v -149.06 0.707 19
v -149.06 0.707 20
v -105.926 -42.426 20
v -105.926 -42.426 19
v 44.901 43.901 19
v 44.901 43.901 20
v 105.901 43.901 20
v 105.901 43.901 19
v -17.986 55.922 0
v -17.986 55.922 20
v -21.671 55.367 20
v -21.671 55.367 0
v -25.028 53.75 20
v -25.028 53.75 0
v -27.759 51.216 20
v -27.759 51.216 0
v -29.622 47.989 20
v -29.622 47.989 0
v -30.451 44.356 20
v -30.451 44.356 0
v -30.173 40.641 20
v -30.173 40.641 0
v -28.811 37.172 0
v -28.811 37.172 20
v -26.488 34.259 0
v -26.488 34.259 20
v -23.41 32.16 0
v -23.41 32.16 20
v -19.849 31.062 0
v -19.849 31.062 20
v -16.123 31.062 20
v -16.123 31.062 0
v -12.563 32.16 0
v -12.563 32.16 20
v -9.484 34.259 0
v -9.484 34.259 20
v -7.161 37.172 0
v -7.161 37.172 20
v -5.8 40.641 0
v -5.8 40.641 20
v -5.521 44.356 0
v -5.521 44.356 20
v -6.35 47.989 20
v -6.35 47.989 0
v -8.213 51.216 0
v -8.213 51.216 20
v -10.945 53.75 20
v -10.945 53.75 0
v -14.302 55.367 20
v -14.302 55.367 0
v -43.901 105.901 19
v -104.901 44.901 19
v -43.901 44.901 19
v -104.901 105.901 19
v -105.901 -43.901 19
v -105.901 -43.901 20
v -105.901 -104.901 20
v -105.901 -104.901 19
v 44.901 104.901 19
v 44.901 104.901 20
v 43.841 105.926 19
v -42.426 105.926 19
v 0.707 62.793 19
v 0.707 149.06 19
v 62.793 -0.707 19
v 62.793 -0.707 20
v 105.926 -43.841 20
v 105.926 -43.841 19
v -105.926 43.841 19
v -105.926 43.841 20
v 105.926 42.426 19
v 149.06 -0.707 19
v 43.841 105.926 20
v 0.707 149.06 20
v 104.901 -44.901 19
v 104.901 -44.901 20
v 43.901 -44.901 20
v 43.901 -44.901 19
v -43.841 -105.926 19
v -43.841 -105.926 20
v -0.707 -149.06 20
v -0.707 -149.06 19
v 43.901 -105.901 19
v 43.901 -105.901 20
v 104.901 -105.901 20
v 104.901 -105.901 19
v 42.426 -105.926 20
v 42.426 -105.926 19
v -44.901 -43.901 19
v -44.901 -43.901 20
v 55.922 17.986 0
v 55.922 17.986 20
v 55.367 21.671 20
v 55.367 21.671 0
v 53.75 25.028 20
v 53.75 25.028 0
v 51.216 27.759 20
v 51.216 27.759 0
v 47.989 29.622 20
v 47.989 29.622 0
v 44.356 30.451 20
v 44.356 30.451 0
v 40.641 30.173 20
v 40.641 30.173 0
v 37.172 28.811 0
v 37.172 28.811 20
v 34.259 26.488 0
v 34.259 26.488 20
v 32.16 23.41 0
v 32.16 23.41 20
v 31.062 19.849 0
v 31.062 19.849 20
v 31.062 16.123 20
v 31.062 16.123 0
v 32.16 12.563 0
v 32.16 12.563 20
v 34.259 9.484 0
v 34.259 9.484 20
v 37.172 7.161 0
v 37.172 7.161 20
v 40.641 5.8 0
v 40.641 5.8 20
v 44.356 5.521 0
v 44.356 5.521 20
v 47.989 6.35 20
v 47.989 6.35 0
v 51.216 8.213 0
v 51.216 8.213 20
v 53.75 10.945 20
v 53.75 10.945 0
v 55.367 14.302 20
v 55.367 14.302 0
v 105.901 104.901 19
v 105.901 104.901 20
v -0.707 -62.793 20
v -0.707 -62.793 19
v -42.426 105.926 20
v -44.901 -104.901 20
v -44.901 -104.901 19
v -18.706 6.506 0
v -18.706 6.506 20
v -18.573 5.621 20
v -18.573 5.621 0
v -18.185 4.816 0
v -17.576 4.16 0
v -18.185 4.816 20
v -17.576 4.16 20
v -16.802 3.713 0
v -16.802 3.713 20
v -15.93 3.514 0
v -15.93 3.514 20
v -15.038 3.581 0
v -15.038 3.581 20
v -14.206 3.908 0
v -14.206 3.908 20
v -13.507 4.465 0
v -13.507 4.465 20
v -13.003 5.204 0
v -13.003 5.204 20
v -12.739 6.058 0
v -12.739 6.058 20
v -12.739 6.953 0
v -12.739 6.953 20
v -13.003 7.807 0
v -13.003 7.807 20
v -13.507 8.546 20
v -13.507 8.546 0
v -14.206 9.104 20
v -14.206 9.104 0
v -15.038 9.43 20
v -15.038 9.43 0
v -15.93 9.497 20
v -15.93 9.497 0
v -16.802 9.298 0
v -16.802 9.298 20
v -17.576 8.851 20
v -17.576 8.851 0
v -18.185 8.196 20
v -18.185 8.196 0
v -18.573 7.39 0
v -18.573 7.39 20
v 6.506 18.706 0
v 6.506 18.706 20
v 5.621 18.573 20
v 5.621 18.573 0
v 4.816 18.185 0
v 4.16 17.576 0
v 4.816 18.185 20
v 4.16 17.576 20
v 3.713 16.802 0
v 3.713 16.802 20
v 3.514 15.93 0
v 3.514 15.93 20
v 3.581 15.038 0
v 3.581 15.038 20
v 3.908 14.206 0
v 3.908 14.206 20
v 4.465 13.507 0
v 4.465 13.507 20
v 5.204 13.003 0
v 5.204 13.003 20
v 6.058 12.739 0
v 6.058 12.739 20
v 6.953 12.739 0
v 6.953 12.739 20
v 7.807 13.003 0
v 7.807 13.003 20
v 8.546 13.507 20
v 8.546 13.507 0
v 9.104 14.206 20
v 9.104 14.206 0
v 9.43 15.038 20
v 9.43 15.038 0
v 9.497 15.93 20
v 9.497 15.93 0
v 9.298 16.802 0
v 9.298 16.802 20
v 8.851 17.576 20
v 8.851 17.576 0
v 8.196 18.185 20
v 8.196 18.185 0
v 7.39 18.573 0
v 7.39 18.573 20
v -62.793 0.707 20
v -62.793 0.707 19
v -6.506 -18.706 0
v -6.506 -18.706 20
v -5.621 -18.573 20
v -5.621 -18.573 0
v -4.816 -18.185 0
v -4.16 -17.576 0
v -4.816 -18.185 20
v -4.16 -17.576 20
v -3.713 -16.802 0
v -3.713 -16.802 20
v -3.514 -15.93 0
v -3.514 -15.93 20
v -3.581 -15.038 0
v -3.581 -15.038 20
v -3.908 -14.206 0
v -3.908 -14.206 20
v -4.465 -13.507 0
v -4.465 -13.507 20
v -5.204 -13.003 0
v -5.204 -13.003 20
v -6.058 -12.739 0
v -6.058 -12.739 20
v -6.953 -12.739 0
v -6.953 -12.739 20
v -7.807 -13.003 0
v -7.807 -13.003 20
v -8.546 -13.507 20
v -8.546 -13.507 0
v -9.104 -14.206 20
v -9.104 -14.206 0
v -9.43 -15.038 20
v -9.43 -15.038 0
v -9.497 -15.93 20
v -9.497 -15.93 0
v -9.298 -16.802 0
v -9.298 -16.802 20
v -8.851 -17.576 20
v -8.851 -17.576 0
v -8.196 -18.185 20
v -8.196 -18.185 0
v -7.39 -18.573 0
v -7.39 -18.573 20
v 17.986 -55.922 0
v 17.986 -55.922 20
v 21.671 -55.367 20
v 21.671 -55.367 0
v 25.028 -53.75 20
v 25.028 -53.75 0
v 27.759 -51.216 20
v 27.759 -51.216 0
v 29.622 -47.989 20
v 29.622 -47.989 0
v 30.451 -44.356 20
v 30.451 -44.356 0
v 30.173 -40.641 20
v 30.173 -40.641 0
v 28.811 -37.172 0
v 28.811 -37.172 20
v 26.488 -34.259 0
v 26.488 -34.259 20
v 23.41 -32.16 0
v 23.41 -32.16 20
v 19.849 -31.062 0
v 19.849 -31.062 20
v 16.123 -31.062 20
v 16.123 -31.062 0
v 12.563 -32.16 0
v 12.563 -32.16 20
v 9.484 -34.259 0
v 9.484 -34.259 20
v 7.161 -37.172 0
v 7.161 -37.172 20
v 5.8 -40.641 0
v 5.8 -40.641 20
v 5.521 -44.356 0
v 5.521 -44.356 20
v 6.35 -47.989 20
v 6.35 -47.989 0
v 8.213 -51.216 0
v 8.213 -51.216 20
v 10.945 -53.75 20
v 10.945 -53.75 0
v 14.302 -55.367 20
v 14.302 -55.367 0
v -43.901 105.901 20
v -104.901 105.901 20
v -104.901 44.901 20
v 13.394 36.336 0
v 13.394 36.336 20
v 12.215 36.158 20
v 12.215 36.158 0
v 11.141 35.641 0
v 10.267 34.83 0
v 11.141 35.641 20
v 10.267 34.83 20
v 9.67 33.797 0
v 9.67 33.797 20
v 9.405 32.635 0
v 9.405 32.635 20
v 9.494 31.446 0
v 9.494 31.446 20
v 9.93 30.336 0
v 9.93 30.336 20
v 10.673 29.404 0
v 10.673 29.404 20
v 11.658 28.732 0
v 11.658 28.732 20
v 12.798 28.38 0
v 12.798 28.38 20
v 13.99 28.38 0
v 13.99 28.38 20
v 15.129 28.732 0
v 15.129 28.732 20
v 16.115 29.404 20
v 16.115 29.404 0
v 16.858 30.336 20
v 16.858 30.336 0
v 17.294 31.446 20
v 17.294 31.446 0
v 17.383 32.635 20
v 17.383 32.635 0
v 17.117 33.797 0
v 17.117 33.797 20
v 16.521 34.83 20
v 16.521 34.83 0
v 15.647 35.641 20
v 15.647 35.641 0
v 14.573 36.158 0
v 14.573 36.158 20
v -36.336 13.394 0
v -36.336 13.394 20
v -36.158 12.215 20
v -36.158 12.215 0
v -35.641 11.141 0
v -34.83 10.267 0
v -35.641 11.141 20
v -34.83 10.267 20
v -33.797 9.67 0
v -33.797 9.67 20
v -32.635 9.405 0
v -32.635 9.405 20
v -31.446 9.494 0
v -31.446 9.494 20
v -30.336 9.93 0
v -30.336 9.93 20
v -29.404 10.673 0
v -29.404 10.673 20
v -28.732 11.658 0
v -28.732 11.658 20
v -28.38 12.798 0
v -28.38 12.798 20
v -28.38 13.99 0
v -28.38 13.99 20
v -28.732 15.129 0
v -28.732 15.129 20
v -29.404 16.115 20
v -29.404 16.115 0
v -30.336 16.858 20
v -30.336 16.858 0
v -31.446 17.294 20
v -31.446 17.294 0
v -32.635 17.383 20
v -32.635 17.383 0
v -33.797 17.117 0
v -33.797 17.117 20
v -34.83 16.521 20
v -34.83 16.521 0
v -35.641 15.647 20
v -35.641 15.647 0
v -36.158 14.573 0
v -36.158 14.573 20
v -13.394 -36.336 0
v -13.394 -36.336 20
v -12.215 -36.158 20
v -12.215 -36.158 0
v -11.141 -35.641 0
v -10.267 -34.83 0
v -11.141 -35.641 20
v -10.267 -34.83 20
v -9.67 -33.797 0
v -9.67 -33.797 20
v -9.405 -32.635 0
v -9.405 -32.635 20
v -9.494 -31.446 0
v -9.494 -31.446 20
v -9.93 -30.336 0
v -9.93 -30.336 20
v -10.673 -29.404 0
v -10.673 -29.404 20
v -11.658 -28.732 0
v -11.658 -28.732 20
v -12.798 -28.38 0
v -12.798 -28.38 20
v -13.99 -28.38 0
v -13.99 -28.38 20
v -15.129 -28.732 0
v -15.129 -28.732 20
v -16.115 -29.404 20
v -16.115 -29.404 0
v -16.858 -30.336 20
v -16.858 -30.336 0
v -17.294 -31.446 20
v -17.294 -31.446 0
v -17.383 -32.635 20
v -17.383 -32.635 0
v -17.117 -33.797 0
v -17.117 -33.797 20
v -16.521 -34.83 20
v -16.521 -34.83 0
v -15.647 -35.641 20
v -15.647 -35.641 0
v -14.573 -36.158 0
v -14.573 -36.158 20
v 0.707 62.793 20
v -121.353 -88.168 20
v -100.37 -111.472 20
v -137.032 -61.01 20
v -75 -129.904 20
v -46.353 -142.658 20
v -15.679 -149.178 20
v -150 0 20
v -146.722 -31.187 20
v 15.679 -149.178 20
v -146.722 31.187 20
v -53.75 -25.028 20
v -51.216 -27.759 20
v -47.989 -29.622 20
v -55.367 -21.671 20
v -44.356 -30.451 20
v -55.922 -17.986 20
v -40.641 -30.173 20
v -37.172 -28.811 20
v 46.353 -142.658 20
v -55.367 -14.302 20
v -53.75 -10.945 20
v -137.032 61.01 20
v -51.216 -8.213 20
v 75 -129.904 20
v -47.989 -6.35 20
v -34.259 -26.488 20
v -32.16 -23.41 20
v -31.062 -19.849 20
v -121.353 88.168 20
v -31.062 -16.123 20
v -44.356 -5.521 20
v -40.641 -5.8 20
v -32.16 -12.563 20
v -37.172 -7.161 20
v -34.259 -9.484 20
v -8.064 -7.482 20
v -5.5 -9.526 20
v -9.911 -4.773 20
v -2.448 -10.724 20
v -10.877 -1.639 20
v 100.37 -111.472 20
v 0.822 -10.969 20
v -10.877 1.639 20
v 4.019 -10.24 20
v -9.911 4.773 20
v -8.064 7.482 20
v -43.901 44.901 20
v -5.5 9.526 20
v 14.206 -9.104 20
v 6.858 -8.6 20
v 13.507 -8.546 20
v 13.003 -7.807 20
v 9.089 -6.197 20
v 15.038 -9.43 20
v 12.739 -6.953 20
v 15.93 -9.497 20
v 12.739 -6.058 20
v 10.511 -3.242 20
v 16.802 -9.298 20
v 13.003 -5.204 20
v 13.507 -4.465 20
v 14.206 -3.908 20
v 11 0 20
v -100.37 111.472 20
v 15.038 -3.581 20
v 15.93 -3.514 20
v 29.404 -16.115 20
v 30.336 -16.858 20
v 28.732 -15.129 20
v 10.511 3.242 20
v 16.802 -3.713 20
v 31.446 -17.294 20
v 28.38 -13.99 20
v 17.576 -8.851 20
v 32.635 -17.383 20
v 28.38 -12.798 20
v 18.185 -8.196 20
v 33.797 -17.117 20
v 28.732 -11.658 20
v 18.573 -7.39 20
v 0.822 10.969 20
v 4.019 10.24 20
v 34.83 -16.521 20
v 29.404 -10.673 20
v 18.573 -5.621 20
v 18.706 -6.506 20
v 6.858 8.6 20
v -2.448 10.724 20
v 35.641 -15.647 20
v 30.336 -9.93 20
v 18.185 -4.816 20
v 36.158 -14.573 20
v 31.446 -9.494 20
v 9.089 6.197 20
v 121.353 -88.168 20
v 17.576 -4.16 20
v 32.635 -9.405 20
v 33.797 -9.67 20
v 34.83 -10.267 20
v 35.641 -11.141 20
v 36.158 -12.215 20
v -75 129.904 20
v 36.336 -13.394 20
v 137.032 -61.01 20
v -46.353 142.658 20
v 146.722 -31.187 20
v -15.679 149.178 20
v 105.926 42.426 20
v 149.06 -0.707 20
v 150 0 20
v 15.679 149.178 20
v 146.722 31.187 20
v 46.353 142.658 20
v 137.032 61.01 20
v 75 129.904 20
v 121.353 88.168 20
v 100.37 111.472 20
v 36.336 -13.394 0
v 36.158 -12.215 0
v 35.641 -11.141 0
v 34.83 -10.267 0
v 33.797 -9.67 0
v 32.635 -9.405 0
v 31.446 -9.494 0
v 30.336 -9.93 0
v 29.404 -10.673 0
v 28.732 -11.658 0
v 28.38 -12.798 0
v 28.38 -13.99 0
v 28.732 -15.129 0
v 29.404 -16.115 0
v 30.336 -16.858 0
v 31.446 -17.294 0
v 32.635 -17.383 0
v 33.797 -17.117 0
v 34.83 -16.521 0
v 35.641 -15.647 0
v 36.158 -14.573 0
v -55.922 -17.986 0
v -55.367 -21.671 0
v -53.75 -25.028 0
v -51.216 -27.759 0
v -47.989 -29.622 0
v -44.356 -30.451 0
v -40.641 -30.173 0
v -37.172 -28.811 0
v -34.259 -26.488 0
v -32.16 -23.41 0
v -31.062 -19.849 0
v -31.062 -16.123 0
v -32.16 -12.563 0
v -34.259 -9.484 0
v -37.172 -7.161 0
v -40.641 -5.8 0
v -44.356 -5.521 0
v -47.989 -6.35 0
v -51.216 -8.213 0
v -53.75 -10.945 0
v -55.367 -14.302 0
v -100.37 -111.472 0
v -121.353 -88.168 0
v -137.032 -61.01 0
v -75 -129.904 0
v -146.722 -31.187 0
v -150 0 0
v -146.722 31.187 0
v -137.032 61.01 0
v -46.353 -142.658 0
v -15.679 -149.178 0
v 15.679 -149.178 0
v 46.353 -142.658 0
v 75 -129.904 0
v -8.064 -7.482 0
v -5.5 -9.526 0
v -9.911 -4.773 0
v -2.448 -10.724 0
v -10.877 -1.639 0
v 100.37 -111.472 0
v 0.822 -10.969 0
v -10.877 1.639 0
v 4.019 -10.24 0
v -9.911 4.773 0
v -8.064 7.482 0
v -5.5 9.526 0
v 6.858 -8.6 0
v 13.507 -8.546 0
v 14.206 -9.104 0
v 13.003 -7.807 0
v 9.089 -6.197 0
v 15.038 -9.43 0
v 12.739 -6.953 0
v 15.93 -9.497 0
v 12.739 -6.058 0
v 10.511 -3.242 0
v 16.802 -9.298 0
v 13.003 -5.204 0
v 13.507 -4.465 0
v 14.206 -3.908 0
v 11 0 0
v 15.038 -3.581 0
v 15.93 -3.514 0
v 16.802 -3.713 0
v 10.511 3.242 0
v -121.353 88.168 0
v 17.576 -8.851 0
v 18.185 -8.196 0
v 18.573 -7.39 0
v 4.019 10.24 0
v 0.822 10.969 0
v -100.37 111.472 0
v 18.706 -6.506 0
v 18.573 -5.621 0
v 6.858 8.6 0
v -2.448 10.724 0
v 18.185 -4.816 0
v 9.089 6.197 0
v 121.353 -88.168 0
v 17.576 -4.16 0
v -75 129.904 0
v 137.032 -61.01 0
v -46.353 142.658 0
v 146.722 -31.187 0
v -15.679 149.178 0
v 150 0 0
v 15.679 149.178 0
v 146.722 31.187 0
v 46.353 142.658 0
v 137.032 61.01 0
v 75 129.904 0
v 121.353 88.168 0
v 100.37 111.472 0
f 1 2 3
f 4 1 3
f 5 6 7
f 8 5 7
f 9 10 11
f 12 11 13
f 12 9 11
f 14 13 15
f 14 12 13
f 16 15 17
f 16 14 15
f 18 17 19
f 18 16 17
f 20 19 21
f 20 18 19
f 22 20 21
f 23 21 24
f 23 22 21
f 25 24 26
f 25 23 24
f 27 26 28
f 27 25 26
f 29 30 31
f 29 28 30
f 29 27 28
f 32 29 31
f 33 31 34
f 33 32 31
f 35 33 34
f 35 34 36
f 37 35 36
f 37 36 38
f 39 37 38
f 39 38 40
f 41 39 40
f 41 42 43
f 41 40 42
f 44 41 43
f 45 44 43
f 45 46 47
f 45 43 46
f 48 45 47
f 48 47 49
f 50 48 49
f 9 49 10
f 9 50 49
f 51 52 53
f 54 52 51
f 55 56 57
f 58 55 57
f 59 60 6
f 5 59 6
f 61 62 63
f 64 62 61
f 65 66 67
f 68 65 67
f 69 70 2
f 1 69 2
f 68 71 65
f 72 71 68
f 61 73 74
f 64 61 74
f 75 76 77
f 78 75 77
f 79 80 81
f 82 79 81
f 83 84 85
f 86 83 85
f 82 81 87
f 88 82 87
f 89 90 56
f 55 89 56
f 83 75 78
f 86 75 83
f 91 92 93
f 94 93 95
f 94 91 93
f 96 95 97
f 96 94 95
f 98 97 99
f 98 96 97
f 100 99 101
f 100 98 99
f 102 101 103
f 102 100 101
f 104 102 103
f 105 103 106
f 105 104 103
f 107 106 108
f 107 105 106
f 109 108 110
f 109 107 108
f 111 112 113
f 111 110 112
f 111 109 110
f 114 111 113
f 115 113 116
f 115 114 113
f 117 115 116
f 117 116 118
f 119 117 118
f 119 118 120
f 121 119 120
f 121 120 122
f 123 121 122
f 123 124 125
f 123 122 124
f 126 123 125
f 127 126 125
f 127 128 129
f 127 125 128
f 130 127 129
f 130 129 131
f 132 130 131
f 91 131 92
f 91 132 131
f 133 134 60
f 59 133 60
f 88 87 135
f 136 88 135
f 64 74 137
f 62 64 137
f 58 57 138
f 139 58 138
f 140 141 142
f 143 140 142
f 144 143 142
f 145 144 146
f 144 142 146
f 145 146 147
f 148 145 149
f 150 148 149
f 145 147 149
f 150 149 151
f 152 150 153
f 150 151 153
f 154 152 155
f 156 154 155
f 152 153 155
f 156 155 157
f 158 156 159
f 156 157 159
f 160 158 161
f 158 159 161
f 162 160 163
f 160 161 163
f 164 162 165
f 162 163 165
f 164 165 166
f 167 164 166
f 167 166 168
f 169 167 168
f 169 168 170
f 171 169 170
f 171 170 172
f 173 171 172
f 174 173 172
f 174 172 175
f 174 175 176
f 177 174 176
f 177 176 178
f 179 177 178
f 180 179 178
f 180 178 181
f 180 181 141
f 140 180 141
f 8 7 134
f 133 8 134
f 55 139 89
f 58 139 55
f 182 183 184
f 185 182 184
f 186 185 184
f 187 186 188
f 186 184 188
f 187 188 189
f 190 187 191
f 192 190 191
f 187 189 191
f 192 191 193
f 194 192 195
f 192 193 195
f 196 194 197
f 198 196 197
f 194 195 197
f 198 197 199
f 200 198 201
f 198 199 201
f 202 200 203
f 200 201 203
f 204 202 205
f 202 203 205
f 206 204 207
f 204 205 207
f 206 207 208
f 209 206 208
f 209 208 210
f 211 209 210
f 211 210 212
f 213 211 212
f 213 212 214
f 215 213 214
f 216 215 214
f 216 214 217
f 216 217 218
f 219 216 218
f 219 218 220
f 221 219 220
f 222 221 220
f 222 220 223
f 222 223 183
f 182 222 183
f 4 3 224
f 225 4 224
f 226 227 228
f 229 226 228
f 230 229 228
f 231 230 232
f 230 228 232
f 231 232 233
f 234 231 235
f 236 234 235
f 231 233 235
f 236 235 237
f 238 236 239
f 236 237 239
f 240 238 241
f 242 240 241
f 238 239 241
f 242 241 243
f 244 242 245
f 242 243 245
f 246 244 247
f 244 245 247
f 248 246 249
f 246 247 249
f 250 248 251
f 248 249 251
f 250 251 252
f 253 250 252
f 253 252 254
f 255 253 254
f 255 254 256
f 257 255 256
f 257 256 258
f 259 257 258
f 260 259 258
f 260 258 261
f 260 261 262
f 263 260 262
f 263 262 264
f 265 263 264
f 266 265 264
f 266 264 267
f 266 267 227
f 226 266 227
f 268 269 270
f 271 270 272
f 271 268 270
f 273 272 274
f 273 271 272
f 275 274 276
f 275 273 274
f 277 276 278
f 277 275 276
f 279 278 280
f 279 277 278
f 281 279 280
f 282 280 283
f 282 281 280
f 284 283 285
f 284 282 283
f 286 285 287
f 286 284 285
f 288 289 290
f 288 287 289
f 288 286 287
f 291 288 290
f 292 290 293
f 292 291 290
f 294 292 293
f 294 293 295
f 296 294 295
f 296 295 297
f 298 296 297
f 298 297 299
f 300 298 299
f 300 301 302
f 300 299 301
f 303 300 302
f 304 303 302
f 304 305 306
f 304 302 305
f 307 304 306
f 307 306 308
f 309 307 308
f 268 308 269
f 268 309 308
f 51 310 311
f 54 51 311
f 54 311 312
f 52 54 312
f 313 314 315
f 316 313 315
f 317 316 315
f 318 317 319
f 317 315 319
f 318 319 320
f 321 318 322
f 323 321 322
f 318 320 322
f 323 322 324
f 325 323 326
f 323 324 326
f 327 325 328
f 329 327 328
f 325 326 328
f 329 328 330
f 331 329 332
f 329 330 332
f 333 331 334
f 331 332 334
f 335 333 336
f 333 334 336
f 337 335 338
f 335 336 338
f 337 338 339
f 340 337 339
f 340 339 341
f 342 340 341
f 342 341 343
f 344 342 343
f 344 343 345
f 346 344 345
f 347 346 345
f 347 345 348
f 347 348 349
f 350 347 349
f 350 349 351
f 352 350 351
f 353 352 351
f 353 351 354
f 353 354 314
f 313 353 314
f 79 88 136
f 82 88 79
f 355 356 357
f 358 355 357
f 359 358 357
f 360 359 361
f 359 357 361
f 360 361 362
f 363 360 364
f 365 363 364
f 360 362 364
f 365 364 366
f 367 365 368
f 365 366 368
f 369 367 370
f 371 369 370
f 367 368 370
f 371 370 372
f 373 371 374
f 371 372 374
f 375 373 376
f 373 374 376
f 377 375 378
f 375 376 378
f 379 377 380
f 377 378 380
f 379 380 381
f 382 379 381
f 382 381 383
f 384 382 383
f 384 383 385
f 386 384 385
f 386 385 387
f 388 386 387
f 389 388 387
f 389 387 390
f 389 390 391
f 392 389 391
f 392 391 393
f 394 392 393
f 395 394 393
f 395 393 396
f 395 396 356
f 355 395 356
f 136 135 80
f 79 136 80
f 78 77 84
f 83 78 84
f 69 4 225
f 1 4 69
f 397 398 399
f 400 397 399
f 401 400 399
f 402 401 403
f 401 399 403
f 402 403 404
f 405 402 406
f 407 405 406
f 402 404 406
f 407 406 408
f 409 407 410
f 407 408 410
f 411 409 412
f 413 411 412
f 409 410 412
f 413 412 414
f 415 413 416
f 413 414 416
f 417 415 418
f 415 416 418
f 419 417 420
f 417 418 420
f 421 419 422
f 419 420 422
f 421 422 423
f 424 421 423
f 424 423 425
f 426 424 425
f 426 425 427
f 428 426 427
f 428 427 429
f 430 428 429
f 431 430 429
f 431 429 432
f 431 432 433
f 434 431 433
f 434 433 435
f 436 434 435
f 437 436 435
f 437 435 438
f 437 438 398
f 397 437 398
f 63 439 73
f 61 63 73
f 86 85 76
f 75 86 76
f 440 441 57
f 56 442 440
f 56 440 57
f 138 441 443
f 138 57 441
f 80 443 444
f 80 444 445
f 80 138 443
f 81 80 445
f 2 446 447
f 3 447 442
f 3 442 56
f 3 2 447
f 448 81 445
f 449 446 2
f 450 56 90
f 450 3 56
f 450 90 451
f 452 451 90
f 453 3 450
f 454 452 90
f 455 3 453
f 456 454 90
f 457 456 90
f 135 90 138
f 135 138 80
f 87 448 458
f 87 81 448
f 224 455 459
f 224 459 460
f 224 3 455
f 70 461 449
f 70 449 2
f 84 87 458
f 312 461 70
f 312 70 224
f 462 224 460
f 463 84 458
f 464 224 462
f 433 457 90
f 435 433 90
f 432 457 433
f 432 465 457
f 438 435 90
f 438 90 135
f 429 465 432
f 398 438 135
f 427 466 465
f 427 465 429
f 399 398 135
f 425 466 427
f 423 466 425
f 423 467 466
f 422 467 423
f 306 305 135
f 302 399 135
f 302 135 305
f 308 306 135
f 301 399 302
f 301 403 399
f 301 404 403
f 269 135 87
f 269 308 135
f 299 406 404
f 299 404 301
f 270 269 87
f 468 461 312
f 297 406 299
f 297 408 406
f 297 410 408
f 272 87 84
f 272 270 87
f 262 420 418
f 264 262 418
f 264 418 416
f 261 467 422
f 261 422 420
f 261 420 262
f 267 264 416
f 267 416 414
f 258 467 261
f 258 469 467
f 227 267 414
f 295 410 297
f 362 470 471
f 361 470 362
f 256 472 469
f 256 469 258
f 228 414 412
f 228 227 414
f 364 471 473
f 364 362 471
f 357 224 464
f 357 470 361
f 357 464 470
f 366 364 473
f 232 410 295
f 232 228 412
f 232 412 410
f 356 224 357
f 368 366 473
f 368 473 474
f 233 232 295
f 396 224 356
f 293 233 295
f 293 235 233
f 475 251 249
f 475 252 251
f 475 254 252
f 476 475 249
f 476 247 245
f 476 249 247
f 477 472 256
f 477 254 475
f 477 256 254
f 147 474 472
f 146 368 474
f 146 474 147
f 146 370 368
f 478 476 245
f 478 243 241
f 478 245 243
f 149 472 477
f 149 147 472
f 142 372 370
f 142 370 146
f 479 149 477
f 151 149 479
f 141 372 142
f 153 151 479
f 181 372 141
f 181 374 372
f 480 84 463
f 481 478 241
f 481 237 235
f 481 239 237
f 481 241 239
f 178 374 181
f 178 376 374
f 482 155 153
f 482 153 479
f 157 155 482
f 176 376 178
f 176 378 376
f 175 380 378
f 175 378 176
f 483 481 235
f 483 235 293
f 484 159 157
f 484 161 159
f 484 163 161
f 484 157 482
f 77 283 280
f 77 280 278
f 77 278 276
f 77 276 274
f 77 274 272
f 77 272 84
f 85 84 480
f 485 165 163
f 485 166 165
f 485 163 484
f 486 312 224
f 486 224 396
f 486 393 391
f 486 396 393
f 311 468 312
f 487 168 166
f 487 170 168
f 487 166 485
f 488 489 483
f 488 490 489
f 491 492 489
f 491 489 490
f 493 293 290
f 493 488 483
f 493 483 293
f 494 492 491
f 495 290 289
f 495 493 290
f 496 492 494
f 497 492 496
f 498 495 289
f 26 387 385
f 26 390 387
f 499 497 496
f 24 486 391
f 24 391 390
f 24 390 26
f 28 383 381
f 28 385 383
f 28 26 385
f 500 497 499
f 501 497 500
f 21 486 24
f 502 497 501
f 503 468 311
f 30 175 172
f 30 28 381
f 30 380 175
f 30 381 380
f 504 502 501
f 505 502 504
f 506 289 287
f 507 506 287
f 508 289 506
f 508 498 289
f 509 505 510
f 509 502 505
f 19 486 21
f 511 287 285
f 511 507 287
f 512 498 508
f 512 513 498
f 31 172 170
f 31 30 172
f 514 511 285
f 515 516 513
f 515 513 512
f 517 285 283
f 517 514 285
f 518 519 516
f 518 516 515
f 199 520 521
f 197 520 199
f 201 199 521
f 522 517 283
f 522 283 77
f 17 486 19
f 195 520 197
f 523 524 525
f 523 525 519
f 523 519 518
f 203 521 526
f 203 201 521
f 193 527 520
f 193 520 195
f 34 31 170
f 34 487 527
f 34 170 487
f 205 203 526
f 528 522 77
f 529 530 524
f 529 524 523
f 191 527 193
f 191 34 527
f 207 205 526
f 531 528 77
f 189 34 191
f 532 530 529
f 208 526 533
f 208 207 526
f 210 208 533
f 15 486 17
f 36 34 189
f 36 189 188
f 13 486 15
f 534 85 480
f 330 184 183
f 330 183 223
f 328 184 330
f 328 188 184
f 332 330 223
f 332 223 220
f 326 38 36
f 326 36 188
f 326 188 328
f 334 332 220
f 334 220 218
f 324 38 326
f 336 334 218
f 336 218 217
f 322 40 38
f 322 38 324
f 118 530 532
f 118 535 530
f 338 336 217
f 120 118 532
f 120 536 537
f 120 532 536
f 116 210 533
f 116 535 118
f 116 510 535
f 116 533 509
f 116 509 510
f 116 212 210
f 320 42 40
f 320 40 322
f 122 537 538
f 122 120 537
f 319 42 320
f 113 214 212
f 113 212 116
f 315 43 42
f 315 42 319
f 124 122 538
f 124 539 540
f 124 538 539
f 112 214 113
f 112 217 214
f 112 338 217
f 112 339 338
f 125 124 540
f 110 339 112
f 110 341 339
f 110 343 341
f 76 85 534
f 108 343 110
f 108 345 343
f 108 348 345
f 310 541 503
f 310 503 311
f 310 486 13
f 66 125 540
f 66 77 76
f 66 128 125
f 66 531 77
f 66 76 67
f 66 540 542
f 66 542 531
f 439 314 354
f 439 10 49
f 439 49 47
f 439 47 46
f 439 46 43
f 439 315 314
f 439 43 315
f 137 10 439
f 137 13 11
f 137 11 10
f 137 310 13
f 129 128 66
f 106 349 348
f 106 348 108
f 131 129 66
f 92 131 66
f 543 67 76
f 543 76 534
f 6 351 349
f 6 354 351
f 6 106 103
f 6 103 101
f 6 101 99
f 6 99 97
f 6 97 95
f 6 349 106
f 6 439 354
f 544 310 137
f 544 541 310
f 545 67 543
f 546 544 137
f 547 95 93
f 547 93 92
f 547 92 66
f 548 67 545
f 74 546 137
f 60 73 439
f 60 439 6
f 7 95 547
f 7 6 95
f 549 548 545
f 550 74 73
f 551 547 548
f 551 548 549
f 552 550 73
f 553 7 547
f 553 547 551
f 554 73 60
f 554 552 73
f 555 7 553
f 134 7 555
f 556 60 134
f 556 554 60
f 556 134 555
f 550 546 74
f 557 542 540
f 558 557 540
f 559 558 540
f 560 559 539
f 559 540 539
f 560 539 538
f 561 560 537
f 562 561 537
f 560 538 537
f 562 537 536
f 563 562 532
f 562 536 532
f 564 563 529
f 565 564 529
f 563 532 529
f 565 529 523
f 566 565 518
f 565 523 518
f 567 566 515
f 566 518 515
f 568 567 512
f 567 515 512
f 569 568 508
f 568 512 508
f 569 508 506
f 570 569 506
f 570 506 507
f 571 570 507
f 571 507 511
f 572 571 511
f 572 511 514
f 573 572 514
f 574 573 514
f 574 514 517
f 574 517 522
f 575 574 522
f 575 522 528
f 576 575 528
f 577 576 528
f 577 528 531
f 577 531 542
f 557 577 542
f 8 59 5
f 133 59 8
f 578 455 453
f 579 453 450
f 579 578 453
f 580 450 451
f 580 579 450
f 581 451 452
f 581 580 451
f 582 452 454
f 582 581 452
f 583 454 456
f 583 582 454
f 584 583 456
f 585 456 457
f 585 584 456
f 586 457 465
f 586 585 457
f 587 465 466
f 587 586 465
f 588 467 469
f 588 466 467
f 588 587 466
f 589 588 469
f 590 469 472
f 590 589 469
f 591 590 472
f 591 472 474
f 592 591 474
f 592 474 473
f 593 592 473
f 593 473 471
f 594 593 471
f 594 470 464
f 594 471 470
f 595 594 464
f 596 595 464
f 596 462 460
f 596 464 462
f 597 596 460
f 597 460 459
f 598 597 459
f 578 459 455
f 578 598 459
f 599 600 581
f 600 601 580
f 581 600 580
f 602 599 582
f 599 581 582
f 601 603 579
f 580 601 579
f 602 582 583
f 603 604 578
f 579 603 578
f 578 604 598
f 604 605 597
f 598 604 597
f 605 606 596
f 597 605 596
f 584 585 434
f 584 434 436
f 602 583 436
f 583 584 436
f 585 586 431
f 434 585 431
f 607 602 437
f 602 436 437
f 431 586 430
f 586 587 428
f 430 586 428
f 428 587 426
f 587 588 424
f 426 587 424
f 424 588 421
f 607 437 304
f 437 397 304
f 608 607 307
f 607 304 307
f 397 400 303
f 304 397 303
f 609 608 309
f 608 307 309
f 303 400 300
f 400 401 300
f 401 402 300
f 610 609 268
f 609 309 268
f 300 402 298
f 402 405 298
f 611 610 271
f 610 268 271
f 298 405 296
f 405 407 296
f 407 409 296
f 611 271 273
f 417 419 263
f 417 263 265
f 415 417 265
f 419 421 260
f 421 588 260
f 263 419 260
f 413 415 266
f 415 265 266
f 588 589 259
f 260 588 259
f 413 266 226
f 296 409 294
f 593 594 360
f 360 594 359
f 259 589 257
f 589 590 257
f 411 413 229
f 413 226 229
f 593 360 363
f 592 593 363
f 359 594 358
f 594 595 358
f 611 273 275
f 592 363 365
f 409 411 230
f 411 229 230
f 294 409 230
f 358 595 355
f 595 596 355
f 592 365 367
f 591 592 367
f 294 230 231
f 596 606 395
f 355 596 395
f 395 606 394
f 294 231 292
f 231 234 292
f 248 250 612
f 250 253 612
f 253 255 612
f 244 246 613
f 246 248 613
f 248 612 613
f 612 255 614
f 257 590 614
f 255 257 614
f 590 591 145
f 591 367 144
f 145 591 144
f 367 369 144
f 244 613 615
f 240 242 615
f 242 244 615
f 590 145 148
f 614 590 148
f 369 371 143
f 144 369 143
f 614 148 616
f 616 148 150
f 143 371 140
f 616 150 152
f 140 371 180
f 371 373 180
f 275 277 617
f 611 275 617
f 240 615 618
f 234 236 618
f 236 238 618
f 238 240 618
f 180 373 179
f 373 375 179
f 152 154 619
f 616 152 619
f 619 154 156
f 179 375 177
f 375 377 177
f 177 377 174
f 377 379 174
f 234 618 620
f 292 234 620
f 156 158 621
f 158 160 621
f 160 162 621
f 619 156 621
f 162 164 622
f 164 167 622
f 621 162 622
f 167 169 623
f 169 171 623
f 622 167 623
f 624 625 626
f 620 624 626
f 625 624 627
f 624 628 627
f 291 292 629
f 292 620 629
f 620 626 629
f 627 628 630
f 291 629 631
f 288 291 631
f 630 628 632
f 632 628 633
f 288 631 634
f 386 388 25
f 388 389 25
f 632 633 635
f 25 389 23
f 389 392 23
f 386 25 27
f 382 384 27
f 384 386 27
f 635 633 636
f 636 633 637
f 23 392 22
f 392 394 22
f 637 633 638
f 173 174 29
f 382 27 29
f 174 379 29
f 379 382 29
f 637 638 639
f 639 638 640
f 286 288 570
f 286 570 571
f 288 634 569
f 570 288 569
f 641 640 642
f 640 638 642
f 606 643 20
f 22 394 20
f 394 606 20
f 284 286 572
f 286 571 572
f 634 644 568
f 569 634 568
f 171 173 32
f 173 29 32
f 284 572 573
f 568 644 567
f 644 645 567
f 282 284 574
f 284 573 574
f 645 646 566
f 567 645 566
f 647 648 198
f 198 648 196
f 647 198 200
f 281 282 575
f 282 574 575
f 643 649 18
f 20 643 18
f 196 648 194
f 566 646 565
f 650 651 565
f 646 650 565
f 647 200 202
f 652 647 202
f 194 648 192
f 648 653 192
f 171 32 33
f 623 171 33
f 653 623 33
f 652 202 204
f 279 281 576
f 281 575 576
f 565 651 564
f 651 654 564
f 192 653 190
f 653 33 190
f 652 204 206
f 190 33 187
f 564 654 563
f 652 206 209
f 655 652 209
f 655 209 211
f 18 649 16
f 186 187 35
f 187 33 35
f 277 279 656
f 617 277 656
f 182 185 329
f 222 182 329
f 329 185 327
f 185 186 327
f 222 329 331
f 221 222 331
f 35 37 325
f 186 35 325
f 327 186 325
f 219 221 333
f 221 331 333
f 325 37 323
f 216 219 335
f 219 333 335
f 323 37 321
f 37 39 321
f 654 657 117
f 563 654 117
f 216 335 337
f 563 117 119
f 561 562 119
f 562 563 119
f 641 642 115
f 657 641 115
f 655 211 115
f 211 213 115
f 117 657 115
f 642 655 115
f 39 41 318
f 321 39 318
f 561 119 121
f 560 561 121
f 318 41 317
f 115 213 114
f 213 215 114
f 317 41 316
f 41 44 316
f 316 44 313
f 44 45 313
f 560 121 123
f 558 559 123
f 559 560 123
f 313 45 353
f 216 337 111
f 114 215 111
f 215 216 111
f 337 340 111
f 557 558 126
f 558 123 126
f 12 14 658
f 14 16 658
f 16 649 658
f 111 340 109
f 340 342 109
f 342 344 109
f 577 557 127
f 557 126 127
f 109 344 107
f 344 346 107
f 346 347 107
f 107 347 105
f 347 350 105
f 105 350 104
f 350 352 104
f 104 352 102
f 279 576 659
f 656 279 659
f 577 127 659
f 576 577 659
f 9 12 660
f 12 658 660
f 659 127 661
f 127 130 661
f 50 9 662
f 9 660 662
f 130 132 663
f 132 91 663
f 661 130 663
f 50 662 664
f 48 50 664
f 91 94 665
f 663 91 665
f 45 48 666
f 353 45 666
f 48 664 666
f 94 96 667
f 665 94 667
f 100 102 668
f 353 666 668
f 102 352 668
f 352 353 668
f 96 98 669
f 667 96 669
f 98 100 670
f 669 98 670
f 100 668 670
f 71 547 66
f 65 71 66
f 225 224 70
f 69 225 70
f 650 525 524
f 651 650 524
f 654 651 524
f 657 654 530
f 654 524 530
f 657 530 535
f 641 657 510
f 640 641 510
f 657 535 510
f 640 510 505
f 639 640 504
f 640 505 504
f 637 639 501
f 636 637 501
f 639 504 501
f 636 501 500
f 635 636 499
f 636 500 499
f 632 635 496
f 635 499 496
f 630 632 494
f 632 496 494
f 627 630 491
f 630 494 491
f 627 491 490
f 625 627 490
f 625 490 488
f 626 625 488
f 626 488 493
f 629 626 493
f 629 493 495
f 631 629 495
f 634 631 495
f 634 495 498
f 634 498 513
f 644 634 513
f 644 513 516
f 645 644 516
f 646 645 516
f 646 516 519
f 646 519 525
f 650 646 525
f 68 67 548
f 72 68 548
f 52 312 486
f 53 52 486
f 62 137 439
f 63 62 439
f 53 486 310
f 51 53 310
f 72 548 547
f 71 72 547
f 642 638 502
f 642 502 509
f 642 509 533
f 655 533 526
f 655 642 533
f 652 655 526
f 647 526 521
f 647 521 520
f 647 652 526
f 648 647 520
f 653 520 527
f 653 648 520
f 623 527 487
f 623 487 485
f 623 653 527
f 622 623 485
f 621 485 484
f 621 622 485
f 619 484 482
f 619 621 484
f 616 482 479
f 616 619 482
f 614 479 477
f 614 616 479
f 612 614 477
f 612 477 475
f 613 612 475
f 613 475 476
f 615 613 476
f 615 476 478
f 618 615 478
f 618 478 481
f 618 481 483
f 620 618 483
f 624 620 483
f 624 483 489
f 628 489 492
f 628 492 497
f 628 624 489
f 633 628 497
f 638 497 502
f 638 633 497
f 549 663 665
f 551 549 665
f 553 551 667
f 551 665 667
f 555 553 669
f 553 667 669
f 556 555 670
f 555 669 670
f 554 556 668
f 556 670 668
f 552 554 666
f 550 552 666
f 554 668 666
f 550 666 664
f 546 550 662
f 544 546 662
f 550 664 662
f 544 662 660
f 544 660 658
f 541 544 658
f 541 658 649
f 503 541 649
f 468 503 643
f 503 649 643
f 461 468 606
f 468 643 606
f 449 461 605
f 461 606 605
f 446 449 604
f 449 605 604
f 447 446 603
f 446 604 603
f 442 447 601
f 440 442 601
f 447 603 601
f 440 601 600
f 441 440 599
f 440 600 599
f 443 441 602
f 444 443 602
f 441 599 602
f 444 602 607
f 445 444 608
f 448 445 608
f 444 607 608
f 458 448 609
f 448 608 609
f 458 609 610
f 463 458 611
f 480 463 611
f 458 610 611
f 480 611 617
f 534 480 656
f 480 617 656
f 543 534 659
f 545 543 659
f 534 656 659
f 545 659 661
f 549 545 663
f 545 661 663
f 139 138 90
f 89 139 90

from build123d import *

# Parameters (mm, degrees)
SKETCH1_R             = 150
SKETCH1_R_2           = 11
BOSS_EXTRUDE1_DEPTH   = 20
F_6_0MM_DOWEL_HOLE1_D = 6
F_8_0MM_DOWEL_HOLE1_D = 8
CIRPATTERN2_COUNT     = 4
CUT_EXTRUDE2_DEPTH    = 1
CIRPATTERN3_COUNT     = 8
SKETCH2_R             = 12.5
CUT_EXTRUDE4_DEPTH    = 214.072757527
CIRPATTERN4_COUNT     = 4


with BuildPart() as part:
    # Sketch1 → Boss-Extrude1 (new body)
    with BuildSketch(Plane.XY):
        Circle(SKETCH1_R)
        Circle(SKETCH1_R_2, mode=Mode.SUBTRACT)
    extrude(amount=BOSS_EXTRUDE1_DEPTH)

    # Ø6.0mm Dowel Hole1 (through all)
    with Locations(Plane(origin=(0, 0, 0), x_dir=(-1, 0, 0), z_dir=(0, 0, -1))):
        with Locations((-15.705952053, -6.50561835)):
            f_6_0mm_dowel_hole1 = Hole(F_6_0MM_DOWEL_HOLE1_D / 2)

    # Ø8.0mm Dowel Hole1 (through all)
    with Locations(Plane(origin=(0, 0, 0), x_dir=(-1, 0, 0), z_dir=(0, 0, -1))):
        with Locations((-32.335783638, -13.393920133)):
            f_8_0mm_dowel_hole1 = Hole(F_8_0MM_DOWEL_HOLE1_D / 2)

    # CirPattern2: Ø6.0mm Dowel Hole1, Ø8.0mm Dowel Hole1 ×4 about axis
    cirpattern2_axis = Axis((0, 0, 0), (0, 0, 1))
    add([f_6_0mm_dowel_hole1.rotate(cirpattern2_axis, i * 360 / CIRPATTERN2_COUNT) for i in range(1, CIRPATTERN2_COUNT)], mode=Mode.SUBTRACT)
    add([f_8_0mm_dowel_hole1.rotate(cirpattern2_axis, i * 360 / CIRPATTERN2_COUNT) for i in range(1, CIRPATTERN2_COUNT)], mode=Mode.SUBTRACT)

    # Sketch9 → Cut-Extrude2 (cut)
    with BuildSketch(Plane.XY.offset(20)):
        Polygon((-42.426406871, 105.926406871), (0.707106781, 62.792893219), (43.840620434, 105.926406871), (0.707106781, 149.059920524), align=None)
    cut_extrude2 = extrude(amount=-CUT_EXTRUDE2_DEPTH, mode=Mode.SUBTRACT)

    # CirPattern3: Cut-Extrude2 ×8 about axis
    cirpattern3_axis = Axis((0, 0, 0), (0, 0, 1))
    for i in range(1, CIRPATTERN3_COUNT):
        add(cut_extrude2.rotate(cirpattern3_axis, i * 360 / CIRPATTERN3_COUNT), mode=Mode.SUBTRACT)

    # Sketch2 → Cut-Extrude4 (cut, through all)
    with BuildSketch(Plane.XY):
        with Locations((43.422338028, 17.986121321)):
            Circle(SKETCH2_R)
    cut_extrude4 = extrude(amount=CUT_EXTRUDE4_DEPTH, mode=Mode.SUBTRACT)

    # CirPattern4: Cut-Extrude4 ×4 about axis
    cirpattern4_axis = Axis((0, 0, 0), (0, 0, 1))
    for i in range(1, CIRPATTERN4_COUNT):
        add(cut_extrude4.rotate(cirpattern4_axis, i * 360 / CIRPATTERN4_COUNT), mode=Mode.SUBTRACT)


solid = part.part
